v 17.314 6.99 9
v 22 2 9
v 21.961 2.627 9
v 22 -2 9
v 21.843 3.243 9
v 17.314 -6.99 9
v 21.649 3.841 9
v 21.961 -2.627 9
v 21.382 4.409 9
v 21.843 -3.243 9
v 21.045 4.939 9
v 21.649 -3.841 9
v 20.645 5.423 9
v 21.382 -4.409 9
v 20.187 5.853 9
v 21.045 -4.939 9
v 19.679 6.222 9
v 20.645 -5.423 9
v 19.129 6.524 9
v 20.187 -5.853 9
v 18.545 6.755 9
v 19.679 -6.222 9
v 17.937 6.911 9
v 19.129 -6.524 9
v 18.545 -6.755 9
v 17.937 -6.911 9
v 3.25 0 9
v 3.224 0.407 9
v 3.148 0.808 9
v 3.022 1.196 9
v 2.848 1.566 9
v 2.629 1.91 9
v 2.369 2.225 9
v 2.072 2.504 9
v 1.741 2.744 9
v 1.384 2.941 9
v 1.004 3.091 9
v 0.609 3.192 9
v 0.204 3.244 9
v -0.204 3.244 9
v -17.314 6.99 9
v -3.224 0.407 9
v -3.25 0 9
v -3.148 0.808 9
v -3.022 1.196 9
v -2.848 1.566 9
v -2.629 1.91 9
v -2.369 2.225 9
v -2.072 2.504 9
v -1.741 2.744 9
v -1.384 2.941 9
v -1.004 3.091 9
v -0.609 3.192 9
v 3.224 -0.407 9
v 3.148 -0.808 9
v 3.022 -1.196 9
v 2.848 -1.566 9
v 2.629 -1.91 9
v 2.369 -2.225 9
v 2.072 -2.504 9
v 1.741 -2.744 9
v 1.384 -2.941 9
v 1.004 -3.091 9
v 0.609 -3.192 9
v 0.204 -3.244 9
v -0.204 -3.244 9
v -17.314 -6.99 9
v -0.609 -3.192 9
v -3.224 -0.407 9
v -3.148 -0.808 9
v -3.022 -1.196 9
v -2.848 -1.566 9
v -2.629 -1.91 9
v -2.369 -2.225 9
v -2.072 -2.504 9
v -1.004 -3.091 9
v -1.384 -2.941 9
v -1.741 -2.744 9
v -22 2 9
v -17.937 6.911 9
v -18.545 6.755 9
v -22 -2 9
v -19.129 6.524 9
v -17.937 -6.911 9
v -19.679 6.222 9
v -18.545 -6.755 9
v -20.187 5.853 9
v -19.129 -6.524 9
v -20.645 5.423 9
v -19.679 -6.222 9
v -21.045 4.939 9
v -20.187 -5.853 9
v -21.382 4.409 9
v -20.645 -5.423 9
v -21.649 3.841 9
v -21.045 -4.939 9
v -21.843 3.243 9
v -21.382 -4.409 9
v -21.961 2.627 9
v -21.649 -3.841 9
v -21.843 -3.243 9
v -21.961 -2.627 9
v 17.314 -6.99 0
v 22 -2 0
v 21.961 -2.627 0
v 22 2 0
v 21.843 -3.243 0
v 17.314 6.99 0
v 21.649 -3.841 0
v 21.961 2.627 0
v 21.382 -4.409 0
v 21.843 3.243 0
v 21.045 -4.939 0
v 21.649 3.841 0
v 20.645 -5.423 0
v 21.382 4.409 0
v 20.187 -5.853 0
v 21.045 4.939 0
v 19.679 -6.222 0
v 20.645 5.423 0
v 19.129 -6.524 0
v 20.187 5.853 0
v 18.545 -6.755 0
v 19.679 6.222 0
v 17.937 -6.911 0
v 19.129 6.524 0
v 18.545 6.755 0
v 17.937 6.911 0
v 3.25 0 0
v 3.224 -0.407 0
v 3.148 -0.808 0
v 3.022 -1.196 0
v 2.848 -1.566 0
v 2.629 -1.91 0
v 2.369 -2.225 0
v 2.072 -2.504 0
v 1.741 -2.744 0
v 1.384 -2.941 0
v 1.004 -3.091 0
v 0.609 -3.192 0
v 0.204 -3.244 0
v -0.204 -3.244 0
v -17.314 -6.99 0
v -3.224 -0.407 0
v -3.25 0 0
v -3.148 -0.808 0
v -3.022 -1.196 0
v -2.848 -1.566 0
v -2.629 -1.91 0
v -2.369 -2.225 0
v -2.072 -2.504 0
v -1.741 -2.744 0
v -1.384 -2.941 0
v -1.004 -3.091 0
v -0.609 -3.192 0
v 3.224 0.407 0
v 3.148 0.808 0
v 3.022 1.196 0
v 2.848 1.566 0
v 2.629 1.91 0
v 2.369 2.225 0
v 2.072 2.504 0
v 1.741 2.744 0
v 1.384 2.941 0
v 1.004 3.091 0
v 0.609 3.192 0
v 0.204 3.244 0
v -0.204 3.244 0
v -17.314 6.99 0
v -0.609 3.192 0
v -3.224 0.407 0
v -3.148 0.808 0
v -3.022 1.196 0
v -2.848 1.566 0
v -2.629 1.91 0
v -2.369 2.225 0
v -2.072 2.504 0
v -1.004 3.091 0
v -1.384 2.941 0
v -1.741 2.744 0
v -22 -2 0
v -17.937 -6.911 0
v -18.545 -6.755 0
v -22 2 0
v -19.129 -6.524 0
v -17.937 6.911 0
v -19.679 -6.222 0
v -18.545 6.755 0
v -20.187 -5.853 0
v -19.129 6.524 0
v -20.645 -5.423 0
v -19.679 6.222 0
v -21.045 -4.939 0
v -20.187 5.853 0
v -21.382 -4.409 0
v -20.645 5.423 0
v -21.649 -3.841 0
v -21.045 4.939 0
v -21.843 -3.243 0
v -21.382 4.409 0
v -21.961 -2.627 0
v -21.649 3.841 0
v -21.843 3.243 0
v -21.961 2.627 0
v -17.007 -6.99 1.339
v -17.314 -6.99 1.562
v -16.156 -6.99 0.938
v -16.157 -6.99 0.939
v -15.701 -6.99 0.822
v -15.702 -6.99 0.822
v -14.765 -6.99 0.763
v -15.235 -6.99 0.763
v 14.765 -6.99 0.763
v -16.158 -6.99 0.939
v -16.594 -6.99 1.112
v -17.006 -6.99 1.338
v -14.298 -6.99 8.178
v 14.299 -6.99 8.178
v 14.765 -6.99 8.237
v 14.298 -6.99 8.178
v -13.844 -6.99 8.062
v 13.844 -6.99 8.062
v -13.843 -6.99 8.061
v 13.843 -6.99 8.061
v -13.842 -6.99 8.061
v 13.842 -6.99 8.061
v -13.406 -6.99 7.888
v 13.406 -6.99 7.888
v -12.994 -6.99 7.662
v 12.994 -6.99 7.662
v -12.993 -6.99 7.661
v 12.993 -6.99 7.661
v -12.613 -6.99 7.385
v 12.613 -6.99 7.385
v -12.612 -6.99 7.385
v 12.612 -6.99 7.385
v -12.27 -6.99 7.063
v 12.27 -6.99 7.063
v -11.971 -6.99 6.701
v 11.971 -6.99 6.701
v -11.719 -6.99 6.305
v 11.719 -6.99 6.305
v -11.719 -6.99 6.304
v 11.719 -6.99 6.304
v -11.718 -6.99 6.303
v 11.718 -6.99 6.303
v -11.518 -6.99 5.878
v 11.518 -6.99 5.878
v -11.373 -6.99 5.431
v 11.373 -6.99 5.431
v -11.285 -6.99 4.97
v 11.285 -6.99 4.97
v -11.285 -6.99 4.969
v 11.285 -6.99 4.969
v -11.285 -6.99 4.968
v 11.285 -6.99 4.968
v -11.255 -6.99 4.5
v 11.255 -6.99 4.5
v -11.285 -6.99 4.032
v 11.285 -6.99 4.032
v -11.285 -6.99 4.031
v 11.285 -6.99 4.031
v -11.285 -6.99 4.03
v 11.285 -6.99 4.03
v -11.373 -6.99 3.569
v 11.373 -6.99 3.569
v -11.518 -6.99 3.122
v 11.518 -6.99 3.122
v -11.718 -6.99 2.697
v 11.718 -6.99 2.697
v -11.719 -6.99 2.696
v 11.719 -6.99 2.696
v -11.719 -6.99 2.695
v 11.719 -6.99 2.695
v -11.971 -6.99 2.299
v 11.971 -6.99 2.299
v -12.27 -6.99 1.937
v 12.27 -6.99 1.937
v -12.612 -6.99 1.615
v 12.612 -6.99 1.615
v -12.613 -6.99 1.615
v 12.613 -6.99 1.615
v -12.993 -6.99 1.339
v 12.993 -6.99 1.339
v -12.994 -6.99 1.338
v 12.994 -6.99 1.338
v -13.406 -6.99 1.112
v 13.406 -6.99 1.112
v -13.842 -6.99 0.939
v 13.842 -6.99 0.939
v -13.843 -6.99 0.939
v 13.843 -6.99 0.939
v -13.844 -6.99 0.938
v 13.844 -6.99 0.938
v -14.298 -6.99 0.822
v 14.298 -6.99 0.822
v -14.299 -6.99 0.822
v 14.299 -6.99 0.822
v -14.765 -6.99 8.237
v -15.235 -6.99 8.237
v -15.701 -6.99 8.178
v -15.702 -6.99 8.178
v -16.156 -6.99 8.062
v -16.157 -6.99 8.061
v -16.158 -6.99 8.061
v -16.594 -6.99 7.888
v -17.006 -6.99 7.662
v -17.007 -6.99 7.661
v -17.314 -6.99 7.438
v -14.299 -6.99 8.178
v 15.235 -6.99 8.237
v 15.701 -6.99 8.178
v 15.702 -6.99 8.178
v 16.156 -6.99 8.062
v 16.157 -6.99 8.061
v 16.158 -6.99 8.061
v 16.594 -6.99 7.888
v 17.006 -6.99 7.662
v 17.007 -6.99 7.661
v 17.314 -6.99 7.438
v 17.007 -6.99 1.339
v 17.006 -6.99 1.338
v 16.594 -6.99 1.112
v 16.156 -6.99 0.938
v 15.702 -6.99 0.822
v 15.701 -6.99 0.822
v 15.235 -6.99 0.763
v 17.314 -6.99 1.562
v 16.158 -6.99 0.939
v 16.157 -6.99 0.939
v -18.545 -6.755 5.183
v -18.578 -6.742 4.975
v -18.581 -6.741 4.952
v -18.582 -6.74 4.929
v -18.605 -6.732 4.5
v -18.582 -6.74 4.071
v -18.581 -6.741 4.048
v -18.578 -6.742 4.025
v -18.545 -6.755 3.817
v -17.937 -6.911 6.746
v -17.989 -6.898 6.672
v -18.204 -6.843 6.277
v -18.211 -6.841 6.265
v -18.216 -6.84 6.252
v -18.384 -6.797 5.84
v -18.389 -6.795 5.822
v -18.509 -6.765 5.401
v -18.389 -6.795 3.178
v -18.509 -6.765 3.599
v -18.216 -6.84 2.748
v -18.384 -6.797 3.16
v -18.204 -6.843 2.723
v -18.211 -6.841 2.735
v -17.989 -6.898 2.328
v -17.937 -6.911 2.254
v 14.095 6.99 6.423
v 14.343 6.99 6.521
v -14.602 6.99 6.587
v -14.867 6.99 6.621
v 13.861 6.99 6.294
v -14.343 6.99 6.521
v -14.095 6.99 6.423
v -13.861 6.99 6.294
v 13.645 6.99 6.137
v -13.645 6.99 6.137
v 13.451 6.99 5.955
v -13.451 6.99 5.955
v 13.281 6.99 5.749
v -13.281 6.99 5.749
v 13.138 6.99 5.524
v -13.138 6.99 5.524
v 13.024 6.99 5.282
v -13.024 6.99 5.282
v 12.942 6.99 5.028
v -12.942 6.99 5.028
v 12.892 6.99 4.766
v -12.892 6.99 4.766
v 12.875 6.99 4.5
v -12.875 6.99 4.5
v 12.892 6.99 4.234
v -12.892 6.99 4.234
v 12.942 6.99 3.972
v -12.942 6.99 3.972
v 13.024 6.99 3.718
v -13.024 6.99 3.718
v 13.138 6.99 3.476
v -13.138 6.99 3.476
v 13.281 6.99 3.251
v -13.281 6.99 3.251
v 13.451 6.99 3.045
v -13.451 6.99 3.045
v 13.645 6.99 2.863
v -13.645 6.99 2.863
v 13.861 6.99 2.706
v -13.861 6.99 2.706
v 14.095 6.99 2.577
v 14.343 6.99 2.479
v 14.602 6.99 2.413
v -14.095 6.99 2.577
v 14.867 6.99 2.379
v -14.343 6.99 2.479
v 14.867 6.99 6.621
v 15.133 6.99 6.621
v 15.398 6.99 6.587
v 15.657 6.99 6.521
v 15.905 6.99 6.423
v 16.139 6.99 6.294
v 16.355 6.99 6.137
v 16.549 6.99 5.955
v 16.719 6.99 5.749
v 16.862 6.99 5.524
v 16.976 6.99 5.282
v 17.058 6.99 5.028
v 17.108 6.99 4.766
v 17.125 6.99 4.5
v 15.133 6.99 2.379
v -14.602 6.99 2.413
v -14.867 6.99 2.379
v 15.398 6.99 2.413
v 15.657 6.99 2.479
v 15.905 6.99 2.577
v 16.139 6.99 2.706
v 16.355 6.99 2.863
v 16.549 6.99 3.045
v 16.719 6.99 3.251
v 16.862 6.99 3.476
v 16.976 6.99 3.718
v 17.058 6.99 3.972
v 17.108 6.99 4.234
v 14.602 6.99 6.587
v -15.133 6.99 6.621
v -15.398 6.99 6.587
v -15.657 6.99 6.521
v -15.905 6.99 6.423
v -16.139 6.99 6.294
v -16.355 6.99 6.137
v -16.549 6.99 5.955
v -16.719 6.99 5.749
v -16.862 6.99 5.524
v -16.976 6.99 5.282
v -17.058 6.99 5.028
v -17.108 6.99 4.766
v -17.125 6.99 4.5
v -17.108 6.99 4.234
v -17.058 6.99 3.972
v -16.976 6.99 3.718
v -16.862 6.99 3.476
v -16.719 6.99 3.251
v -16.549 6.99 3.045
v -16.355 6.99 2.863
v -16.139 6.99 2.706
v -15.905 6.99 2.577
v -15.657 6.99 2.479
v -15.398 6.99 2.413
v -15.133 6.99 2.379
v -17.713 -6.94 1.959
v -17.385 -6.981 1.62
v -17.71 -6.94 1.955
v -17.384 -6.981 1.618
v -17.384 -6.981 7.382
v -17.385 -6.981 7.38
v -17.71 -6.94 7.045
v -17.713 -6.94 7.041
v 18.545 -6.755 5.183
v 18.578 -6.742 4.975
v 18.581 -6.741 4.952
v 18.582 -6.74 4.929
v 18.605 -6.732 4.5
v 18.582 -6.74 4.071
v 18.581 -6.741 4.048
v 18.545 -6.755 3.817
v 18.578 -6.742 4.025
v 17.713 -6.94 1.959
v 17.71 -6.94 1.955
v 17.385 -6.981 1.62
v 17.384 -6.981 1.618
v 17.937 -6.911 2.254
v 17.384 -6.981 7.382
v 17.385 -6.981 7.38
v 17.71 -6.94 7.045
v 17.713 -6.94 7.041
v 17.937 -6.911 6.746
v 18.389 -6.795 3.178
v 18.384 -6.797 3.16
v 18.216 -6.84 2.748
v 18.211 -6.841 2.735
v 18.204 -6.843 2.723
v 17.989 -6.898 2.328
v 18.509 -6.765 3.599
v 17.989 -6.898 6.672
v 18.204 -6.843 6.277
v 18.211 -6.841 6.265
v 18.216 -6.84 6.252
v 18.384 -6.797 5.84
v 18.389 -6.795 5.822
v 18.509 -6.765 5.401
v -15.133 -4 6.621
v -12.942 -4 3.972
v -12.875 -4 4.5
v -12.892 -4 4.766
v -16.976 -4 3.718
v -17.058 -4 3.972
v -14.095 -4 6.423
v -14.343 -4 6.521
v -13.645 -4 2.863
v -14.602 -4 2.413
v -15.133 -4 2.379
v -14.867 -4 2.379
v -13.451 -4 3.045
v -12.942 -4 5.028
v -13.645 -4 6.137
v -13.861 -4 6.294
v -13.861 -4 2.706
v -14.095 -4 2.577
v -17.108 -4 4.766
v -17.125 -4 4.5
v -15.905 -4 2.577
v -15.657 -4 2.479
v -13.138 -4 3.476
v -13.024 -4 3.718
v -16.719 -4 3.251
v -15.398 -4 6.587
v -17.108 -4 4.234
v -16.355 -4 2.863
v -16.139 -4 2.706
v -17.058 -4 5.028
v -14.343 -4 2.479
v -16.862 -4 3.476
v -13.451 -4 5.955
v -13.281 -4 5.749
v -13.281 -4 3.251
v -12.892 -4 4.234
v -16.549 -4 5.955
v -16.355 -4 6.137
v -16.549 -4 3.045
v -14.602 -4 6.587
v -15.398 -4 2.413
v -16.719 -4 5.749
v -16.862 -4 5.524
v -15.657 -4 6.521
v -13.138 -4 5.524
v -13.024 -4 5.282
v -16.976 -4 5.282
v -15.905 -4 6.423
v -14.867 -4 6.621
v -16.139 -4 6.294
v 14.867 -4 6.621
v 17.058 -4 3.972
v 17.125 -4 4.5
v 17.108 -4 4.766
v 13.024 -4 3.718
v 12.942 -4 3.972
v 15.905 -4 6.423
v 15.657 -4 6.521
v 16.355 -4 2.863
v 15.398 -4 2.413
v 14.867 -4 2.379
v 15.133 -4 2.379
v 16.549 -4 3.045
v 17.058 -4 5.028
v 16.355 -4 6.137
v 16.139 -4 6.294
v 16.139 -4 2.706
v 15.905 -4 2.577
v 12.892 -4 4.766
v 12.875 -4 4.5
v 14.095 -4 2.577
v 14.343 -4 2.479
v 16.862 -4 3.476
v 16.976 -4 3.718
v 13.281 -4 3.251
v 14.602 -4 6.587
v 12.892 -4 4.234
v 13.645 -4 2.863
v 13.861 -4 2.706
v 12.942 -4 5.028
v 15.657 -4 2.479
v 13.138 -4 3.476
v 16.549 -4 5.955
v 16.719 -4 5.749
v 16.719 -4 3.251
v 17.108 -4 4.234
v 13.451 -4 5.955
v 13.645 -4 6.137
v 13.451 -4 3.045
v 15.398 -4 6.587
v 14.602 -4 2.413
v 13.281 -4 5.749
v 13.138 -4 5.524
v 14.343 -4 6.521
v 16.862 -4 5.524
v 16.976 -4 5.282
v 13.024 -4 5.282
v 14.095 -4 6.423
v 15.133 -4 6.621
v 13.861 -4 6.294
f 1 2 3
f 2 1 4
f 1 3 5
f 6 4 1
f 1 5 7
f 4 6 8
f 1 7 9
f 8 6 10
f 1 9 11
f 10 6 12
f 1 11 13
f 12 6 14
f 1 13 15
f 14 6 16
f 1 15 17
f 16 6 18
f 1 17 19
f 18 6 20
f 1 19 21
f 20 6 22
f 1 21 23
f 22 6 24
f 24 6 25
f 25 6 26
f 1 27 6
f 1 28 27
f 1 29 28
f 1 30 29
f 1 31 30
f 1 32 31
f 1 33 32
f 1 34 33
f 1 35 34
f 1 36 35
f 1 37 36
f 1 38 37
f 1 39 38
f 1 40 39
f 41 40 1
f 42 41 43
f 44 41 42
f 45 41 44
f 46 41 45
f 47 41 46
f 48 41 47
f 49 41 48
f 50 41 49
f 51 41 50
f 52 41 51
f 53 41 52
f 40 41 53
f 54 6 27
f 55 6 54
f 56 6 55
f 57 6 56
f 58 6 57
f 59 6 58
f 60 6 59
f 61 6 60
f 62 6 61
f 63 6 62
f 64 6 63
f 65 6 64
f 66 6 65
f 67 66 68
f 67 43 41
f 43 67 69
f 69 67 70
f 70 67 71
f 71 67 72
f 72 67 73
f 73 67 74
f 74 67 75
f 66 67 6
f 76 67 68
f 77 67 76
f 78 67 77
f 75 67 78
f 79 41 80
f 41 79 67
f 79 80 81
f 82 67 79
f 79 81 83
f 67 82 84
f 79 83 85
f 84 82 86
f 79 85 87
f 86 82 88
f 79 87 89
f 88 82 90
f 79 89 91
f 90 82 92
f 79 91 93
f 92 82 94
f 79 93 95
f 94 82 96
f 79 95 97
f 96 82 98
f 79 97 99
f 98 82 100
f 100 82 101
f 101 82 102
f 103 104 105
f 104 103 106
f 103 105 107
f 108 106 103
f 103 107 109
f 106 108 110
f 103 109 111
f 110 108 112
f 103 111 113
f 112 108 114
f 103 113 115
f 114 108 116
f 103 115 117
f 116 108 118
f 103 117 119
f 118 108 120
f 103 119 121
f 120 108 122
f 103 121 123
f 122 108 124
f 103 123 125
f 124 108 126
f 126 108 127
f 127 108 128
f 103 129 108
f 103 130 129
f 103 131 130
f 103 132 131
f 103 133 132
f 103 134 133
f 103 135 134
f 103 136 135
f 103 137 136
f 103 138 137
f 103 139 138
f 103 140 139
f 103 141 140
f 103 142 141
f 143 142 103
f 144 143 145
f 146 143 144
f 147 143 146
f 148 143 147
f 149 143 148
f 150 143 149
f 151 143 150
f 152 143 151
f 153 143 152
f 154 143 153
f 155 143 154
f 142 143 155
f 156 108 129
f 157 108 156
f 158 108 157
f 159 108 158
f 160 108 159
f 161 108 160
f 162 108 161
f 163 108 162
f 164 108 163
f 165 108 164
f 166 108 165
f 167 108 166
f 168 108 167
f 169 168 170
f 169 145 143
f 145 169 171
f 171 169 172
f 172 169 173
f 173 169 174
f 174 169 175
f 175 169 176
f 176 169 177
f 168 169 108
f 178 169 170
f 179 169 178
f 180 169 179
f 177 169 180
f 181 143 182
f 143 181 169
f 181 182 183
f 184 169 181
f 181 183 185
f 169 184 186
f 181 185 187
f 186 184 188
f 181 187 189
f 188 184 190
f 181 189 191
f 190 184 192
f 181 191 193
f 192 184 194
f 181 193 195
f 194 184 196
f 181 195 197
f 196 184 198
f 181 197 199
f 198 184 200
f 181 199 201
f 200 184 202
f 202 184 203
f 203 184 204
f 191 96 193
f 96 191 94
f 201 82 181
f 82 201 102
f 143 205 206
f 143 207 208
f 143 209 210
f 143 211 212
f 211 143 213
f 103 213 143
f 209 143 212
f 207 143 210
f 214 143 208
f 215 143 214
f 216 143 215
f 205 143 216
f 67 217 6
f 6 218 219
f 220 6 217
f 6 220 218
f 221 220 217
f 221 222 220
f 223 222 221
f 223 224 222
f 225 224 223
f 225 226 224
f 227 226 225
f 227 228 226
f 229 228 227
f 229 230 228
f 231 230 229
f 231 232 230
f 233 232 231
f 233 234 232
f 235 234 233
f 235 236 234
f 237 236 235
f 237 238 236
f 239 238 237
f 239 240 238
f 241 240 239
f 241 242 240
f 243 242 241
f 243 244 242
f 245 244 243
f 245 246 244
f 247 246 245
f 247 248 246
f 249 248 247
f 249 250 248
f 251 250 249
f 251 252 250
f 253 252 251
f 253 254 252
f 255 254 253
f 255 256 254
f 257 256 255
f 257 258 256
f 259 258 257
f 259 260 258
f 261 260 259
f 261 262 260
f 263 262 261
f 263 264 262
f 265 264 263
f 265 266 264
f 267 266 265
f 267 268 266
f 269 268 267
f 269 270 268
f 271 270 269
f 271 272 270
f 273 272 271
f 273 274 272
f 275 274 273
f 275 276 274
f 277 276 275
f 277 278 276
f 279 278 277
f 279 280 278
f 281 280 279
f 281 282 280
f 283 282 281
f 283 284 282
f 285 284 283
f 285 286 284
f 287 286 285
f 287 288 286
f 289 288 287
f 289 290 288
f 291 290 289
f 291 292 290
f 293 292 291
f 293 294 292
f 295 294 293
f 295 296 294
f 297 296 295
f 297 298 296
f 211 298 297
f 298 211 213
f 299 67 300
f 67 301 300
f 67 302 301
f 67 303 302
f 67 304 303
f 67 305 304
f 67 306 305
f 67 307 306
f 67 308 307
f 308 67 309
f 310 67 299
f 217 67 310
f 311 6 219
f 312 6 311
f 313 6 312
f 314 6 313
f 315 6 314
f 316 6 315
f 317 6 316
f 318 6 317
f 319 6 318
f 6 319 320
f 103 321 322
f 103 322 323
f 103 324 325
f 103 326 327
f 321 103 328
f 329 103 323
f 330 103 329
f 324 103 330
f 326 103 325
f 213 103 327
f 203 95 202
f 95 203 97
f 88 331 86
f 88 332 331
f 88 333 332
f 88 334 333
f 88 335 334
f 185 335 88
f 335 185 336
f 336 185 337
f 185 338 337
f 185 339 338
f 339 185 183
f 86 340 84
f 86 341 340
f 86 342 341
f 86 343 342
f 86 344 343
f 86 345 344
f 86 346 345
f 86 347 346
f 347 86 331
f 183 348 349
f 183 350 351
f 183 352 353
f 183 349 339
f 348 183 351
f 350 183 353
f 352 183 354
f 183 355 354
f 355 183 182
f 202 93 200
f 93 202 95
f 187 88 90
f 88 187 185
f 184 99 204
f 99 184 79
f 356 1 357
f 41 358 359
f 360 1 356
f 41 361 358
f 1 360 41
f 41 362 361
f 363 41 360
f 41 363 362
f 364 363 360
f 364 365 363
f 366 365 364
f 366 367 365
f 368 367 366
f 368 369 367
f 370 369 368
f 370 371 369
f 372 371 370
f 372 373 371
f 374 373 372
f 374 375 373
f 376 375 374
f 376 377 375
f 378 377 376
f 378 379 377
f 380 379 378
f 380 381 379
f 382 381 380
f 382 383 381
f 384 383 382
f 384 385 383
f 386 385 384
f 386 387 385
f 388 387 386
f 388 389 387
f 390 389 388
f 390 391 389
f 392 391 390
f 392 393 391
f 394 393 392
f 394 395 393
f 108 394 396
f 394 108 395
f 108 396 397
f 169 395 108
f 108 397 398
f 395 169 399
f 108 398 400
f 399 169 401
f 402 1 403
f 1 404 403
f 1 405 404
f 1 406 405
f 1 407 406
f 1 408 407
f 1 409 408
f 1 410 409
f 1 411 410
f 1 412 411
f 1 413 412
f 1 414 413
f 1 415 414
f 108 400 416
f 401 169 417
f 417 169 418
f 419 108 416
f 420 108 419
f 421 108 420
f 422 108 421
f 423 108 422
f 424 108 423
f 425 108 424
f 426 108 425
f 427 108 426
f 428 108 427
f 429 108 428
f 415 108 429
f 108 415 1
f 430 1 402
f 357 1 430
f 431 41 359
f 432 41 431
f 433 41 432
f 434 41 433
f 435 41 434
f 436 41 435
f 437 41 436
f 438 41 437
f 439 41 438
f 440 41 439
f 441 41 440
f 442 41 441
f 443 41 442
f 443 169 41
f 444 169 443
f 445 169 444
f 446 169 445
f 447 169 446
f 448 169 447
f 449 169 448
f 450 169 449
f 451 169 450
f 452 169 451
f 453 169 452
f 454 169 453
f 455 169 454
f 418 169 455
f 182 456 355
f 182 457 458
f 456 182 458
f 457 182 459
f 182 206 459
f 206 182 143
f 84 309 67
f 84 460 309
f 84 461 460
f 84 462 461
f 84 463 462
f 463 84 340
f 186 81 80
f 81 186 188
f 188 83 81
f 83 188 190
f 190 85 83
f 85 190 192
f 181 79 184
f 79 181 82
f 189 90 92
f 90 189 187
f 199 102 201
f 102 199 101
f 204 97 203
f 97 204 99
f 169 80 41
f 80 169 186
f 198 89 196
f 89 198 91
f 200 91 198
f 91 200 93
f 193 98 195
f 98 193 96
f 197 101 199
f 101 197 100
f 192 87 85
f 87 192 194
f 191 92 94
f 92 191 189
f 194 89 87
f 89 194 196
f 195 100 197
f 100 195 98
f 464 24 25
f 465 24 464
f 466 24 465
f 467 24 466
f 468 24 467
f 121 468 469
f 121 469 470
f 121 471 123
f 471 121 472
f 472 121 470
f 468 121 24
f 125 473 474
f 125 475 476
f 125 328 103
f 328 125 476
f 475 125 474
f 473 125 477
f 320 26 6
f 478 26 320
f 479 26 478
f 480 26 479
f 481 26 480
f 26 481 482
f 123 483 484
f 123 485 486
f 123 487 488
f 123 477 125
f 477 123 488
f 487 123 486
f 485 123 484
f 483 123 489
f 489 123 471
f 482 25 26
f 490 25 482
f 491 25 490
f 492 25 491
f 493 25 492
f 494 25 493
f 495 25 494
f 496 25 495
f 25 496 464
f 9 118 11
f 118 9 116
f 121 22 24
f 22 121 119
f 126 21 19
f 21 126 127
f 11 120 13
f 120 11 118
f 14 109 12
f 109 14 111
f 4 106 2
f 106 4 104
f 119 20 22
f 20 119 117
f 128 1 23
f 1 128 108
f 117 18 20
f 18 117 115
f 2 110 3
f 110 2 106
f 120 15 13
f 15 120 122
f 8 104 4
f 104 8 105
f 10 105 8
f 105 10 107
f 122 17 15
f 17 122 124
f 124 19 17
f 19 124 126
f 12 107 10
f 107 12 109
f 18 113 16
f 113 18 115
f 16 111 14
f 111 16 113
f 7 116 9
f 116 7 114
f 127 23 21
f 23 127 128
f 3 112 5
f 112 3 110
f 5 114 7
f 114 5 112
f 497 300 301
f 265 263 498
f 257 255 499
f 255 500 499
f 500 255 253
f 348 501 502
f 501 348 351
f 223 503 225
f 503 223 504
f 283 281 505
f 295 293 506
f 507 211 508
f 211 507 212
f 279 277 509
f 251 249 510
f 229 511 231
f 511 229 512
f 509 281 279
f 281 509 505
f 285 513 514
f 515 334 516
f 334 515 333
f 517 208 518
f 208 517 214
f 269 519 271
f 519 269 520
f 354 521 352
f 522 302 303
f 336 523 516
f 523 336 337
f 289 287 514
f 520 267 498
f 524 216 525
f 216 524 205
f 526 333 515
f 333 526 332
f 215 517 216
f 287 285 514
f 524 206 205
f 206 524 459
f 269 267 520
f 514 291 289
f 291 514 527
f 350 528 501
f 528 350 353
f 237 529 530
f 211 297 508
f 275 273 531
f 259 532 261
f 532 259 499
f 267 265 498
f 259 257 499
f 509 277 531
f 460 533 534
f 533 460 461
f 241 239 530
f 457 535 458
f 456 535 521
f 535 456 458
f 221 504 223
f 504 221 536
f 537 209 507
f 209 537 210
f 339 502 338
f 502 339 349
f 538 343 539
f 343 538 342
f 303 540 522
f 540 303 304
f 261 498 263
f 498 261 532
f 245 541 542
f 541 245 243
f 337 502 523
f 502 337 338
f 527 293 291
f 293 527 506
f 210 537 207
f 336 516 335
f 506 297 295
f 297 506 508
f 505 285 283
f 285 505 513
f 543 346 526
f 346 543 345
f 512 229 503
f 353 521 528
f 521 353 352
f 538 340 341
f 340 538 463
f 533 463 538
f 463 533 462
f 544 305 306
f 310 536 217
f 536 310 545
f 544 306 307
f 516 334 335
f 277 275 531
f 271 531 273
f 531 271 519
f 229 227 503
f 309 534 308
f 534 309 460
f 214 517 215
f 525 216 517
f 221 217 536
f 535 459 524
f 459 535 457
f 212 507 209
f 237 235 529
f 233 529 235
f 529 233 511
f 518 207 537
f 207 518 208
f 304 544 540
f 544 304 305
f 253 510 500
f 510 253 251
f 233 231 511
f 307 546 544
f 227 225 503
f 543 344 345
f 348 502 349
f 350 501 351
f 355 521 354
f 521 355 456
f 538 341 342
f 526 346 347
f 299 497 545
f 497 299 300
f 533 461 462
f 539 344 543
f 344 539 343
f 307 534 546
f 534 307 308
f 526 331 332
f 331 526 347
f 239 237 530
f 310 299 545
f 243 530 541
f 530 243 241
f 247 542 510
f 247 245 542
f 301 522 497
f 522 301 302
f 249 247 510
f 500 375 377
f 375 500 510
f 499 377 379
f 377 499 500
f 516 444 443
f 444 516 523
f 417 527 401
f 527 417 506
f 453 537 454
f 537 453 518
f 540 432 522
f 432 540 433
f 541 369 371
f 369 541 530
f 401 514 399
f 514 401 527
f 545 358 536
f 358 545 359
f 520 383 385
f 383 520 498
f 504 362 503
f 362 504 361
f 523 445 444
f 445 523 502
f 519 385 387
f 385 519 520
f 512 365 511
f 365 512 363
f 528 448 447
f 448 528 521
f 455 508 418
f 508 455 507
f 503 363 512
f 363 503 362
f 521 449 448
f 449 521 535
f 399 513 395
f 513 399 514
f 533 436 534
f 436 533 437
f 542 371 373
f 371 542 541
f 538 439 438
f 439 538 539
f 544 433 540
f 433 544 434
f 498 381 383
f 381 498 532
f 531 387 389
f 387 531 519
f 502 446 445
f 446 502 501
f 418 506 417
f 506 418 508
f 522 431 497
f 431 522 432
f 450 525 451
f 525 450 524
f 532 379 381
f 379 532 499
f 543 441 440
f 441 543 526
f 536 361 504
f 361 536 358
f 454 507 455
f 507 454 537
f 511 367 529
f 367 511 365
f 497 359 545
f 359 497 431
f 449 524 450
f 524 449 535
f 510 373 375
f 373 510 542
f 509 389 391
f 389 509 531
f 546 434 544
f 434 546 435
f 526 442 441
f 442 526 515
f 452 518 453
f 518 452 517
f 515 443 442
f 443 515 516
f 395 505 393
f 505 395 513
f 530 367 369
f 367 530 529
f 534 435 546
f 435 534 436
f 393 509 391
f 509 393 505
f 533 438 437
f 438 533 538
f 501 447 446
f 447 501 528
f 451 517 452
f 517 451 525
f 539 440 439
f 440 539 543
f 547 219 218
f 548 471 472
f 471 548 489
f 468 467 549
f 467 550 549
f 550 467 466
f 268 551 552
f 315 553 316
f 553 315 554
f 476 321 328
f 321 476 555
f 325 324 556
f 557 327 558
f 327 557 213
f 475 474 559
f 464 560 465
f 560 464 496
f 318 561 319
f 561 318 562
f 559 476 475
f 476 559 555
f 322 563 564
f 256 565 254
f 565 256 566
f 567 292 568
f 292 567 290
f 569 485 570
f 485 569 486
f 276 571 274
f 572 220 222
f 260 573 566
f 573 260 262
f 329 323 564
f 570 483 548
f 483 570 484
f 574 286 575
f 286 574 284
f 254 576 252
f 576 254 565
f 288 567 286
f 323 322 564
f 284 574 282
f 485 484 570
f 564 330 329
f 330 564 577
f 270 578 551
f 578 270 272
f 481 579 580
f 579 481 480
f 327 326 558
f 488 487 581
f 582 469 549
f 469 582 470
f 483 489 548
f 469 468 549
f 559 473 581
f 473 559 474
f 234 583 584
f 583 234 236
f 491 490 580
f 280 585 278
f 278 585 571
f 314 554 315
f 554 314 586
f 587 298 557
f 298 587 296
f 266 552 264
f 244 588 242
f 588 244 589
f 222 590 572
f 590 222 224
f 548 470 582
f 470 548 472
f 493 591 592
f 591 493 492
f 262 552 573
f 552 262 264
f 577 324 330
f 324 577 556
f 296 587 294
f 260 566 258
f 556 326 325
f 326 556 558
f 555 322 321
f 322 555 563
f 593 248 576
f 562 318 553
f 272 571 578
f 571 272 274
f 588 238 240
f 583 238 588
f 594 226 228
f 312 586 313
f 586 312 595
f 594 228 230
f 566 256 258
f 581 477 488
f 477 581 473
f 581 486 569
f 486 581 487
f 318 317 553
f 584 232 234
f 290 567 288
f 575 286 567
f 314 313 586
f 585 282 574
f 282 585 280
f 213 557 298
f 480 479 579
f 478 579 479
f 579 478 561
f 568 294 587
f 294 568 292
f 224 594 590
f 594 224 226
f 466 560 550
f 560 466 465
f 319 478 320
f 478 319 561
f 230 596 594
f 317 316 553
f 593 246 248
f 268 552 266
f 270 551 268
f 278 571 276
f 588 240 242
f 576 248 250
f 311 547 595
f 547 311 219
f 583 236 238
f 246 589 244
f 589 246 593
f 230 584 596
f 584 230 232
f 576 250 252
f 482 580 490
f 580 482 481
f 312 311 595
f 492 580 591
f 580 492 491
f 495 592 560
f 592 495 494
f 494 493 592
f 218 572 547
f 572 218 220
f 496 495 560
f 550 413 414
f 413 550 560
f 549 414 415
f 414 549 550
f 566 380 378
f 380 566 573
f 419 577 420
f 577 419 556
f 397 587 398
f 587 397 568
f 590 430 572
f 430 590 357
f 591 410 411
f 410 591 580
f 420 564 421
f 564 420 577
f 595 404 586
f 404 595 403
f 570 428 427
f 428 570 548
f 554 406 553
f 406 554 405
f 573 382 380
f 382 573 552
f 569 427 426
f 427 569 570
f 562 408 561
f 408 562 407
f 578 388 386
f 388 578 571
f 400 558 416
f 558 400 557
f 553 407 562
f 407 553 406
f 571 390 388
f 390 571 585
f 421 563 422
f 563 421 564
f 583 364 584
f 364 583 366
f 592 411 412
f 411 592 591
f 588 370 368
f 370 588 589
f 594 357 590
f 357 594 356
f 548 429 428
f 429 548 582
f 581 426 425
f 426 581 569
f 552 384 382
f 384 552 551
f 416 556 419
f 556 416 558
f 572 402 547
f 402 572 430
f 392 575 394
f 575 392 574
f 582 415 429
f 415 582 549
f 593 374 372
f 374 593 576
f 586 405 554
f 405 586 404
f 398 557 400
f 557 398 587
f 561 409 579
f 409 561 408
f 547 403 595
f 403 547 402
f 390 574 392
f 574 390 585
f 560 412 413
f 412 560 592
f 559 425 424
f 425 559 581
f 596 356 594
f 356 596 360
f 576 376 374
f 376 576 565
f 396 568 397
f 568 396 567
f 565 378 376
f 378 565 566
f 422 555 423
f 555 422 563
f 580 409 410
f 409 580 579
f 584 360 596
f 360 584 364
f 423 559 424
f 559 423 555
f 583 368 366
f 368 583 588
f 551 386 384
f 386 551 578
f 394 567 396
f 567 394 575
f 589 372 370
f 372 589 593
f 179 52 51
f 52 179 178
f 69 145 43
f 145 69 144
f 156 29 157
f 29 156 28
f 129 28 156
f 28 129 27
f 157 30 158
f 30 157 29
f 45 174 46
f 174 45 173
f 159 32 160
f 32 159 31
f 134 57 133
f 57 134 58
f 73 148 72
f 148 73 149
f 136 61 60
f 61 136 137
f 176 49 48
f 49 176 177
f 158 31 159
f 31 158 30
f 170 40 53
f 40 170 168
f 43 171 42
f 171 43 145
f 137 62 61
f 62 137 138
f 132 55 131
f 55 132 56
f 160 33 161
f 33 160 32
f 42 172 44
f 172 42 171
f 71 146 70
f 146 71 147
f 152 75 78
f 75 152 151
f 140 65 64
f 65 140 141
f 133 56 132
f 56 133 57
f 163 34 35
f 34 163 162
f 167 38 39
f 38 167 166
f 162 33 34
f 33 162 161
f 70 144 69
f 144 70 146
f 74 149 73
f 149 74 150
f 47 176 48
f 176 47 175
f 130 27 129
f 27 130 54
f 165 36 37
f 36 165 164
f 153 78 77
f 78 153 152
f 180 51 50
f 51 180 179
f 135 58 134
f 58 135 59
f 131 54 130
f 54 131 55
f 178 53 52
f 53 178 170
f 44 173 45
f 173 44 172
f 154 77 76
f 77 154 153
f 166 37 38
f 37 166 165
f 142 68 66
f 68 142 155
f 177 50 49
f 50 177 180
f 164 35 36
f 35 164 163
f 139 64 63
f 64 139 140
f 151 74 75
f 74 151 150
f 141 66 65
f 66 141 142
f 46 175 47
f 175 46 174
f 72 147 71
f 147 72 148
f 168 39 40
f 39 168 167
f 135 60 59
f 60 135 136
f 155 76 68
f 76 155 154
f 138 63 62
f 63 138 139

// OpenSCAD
$fn = 50;


difference() {
	union() {
		cylinder(h = 9, r = 7.0000000000);
		translate(v = [-7.5000000000, 0.0000000000, 0]) {
			hull() {
				translate(v = [-9.5000000000, 2.0000000000, 0]) {
					cylinder(h = 9, r = 5);
				}
				translate(v = [9.5000000000, 2.0000000000, 0]) {
					cylinder(h = 9, r = 5);
				}
				translate(v = [-9.5000000000, -2.0000000000, 0]) {
					cylinder(h = 9, r = 5);
				}
				translate(v = [9.5000000000, -2.0000000000, 0]) {
					cylinder(h = 9, r = 5);
				}
			}
		}
		translate(v = [7.5000000000, 0.0000000000, 0]) {
			hull() {
				translate(v = [-9.5000000000, 2.0000000000, 0]) {
					cylinder(h = 9, r = 5);
				}
				translate(v = [9.5000000000, 2.0000000000, 0]) {
					cylinder(h = 9, r = 5);
				}
				translate(v = [-9.5000000000, -2.0000000000, 0]) {
					cylinder(h = 9, r = 5);
				}
				translate(v = [9.5000000000, -2.0000000000, 0]) {
					cylinder(h = 9, r = 5);
				}
			}
		}
	}
	union() {
		translate(v = [-15.0000000000, -7.0000000000, 4.5000000000]) {
			rotate(a = [90, 0, 0]) {
				difference() {
					union() {
						#translate(v = [0, 0, -14.0000000000]) {
							cylinder(h = 14, r = 2.0000000000);
						}
						#translate(v = [0, 0, -3]) {
							cylinder(h = 3, r1 = 2.1250000000, r2 = 3.7500000000);
						}
						#translate(v = [0, 0, -14.0000000000]) {
							cylinder(h = 14, r = 2.1250000000);
						}
						#translate(v = [0, 0, -14.0000000000]) {
							cylinder(h = 14, r = 2.0000000000);
						}
					}
					union();
				}
			}
		}
		translate(v = [15.0000000000, -7.0000000000, 4.5000000000]) {
			rotate(a = [90, 0, 0]) {
				difference() {
					union() {
						#translate(v = [0, 0, -14.0000000000]) {
							cylinder(h = 14, r = 2.0000000000);
						}
						#translate(v = [0, 0, -3]) {
							cylinder(h = 3, r1 = 2.1250000000, r2 = 3.7500000000);
						}
						#translate(v = [0, 0, -14.0000000000]) {
							cylinder(h = 14, r = 2.1250000000);
						}
						#translate(v = [0, 0, -14.0000000000]) {
							cylinder(h = 14, r = 2.0000000000);
						}
					}
					union();
				}
			}
		}
		translate(v = [0, 0, -100]) {
			cylinder(h = 200, r = 3.2500000000);
		}
		translate(v = [0, 0, -100]) {
			cylinder(h = 200, r = 1.8000000000);
		}
	}
}
